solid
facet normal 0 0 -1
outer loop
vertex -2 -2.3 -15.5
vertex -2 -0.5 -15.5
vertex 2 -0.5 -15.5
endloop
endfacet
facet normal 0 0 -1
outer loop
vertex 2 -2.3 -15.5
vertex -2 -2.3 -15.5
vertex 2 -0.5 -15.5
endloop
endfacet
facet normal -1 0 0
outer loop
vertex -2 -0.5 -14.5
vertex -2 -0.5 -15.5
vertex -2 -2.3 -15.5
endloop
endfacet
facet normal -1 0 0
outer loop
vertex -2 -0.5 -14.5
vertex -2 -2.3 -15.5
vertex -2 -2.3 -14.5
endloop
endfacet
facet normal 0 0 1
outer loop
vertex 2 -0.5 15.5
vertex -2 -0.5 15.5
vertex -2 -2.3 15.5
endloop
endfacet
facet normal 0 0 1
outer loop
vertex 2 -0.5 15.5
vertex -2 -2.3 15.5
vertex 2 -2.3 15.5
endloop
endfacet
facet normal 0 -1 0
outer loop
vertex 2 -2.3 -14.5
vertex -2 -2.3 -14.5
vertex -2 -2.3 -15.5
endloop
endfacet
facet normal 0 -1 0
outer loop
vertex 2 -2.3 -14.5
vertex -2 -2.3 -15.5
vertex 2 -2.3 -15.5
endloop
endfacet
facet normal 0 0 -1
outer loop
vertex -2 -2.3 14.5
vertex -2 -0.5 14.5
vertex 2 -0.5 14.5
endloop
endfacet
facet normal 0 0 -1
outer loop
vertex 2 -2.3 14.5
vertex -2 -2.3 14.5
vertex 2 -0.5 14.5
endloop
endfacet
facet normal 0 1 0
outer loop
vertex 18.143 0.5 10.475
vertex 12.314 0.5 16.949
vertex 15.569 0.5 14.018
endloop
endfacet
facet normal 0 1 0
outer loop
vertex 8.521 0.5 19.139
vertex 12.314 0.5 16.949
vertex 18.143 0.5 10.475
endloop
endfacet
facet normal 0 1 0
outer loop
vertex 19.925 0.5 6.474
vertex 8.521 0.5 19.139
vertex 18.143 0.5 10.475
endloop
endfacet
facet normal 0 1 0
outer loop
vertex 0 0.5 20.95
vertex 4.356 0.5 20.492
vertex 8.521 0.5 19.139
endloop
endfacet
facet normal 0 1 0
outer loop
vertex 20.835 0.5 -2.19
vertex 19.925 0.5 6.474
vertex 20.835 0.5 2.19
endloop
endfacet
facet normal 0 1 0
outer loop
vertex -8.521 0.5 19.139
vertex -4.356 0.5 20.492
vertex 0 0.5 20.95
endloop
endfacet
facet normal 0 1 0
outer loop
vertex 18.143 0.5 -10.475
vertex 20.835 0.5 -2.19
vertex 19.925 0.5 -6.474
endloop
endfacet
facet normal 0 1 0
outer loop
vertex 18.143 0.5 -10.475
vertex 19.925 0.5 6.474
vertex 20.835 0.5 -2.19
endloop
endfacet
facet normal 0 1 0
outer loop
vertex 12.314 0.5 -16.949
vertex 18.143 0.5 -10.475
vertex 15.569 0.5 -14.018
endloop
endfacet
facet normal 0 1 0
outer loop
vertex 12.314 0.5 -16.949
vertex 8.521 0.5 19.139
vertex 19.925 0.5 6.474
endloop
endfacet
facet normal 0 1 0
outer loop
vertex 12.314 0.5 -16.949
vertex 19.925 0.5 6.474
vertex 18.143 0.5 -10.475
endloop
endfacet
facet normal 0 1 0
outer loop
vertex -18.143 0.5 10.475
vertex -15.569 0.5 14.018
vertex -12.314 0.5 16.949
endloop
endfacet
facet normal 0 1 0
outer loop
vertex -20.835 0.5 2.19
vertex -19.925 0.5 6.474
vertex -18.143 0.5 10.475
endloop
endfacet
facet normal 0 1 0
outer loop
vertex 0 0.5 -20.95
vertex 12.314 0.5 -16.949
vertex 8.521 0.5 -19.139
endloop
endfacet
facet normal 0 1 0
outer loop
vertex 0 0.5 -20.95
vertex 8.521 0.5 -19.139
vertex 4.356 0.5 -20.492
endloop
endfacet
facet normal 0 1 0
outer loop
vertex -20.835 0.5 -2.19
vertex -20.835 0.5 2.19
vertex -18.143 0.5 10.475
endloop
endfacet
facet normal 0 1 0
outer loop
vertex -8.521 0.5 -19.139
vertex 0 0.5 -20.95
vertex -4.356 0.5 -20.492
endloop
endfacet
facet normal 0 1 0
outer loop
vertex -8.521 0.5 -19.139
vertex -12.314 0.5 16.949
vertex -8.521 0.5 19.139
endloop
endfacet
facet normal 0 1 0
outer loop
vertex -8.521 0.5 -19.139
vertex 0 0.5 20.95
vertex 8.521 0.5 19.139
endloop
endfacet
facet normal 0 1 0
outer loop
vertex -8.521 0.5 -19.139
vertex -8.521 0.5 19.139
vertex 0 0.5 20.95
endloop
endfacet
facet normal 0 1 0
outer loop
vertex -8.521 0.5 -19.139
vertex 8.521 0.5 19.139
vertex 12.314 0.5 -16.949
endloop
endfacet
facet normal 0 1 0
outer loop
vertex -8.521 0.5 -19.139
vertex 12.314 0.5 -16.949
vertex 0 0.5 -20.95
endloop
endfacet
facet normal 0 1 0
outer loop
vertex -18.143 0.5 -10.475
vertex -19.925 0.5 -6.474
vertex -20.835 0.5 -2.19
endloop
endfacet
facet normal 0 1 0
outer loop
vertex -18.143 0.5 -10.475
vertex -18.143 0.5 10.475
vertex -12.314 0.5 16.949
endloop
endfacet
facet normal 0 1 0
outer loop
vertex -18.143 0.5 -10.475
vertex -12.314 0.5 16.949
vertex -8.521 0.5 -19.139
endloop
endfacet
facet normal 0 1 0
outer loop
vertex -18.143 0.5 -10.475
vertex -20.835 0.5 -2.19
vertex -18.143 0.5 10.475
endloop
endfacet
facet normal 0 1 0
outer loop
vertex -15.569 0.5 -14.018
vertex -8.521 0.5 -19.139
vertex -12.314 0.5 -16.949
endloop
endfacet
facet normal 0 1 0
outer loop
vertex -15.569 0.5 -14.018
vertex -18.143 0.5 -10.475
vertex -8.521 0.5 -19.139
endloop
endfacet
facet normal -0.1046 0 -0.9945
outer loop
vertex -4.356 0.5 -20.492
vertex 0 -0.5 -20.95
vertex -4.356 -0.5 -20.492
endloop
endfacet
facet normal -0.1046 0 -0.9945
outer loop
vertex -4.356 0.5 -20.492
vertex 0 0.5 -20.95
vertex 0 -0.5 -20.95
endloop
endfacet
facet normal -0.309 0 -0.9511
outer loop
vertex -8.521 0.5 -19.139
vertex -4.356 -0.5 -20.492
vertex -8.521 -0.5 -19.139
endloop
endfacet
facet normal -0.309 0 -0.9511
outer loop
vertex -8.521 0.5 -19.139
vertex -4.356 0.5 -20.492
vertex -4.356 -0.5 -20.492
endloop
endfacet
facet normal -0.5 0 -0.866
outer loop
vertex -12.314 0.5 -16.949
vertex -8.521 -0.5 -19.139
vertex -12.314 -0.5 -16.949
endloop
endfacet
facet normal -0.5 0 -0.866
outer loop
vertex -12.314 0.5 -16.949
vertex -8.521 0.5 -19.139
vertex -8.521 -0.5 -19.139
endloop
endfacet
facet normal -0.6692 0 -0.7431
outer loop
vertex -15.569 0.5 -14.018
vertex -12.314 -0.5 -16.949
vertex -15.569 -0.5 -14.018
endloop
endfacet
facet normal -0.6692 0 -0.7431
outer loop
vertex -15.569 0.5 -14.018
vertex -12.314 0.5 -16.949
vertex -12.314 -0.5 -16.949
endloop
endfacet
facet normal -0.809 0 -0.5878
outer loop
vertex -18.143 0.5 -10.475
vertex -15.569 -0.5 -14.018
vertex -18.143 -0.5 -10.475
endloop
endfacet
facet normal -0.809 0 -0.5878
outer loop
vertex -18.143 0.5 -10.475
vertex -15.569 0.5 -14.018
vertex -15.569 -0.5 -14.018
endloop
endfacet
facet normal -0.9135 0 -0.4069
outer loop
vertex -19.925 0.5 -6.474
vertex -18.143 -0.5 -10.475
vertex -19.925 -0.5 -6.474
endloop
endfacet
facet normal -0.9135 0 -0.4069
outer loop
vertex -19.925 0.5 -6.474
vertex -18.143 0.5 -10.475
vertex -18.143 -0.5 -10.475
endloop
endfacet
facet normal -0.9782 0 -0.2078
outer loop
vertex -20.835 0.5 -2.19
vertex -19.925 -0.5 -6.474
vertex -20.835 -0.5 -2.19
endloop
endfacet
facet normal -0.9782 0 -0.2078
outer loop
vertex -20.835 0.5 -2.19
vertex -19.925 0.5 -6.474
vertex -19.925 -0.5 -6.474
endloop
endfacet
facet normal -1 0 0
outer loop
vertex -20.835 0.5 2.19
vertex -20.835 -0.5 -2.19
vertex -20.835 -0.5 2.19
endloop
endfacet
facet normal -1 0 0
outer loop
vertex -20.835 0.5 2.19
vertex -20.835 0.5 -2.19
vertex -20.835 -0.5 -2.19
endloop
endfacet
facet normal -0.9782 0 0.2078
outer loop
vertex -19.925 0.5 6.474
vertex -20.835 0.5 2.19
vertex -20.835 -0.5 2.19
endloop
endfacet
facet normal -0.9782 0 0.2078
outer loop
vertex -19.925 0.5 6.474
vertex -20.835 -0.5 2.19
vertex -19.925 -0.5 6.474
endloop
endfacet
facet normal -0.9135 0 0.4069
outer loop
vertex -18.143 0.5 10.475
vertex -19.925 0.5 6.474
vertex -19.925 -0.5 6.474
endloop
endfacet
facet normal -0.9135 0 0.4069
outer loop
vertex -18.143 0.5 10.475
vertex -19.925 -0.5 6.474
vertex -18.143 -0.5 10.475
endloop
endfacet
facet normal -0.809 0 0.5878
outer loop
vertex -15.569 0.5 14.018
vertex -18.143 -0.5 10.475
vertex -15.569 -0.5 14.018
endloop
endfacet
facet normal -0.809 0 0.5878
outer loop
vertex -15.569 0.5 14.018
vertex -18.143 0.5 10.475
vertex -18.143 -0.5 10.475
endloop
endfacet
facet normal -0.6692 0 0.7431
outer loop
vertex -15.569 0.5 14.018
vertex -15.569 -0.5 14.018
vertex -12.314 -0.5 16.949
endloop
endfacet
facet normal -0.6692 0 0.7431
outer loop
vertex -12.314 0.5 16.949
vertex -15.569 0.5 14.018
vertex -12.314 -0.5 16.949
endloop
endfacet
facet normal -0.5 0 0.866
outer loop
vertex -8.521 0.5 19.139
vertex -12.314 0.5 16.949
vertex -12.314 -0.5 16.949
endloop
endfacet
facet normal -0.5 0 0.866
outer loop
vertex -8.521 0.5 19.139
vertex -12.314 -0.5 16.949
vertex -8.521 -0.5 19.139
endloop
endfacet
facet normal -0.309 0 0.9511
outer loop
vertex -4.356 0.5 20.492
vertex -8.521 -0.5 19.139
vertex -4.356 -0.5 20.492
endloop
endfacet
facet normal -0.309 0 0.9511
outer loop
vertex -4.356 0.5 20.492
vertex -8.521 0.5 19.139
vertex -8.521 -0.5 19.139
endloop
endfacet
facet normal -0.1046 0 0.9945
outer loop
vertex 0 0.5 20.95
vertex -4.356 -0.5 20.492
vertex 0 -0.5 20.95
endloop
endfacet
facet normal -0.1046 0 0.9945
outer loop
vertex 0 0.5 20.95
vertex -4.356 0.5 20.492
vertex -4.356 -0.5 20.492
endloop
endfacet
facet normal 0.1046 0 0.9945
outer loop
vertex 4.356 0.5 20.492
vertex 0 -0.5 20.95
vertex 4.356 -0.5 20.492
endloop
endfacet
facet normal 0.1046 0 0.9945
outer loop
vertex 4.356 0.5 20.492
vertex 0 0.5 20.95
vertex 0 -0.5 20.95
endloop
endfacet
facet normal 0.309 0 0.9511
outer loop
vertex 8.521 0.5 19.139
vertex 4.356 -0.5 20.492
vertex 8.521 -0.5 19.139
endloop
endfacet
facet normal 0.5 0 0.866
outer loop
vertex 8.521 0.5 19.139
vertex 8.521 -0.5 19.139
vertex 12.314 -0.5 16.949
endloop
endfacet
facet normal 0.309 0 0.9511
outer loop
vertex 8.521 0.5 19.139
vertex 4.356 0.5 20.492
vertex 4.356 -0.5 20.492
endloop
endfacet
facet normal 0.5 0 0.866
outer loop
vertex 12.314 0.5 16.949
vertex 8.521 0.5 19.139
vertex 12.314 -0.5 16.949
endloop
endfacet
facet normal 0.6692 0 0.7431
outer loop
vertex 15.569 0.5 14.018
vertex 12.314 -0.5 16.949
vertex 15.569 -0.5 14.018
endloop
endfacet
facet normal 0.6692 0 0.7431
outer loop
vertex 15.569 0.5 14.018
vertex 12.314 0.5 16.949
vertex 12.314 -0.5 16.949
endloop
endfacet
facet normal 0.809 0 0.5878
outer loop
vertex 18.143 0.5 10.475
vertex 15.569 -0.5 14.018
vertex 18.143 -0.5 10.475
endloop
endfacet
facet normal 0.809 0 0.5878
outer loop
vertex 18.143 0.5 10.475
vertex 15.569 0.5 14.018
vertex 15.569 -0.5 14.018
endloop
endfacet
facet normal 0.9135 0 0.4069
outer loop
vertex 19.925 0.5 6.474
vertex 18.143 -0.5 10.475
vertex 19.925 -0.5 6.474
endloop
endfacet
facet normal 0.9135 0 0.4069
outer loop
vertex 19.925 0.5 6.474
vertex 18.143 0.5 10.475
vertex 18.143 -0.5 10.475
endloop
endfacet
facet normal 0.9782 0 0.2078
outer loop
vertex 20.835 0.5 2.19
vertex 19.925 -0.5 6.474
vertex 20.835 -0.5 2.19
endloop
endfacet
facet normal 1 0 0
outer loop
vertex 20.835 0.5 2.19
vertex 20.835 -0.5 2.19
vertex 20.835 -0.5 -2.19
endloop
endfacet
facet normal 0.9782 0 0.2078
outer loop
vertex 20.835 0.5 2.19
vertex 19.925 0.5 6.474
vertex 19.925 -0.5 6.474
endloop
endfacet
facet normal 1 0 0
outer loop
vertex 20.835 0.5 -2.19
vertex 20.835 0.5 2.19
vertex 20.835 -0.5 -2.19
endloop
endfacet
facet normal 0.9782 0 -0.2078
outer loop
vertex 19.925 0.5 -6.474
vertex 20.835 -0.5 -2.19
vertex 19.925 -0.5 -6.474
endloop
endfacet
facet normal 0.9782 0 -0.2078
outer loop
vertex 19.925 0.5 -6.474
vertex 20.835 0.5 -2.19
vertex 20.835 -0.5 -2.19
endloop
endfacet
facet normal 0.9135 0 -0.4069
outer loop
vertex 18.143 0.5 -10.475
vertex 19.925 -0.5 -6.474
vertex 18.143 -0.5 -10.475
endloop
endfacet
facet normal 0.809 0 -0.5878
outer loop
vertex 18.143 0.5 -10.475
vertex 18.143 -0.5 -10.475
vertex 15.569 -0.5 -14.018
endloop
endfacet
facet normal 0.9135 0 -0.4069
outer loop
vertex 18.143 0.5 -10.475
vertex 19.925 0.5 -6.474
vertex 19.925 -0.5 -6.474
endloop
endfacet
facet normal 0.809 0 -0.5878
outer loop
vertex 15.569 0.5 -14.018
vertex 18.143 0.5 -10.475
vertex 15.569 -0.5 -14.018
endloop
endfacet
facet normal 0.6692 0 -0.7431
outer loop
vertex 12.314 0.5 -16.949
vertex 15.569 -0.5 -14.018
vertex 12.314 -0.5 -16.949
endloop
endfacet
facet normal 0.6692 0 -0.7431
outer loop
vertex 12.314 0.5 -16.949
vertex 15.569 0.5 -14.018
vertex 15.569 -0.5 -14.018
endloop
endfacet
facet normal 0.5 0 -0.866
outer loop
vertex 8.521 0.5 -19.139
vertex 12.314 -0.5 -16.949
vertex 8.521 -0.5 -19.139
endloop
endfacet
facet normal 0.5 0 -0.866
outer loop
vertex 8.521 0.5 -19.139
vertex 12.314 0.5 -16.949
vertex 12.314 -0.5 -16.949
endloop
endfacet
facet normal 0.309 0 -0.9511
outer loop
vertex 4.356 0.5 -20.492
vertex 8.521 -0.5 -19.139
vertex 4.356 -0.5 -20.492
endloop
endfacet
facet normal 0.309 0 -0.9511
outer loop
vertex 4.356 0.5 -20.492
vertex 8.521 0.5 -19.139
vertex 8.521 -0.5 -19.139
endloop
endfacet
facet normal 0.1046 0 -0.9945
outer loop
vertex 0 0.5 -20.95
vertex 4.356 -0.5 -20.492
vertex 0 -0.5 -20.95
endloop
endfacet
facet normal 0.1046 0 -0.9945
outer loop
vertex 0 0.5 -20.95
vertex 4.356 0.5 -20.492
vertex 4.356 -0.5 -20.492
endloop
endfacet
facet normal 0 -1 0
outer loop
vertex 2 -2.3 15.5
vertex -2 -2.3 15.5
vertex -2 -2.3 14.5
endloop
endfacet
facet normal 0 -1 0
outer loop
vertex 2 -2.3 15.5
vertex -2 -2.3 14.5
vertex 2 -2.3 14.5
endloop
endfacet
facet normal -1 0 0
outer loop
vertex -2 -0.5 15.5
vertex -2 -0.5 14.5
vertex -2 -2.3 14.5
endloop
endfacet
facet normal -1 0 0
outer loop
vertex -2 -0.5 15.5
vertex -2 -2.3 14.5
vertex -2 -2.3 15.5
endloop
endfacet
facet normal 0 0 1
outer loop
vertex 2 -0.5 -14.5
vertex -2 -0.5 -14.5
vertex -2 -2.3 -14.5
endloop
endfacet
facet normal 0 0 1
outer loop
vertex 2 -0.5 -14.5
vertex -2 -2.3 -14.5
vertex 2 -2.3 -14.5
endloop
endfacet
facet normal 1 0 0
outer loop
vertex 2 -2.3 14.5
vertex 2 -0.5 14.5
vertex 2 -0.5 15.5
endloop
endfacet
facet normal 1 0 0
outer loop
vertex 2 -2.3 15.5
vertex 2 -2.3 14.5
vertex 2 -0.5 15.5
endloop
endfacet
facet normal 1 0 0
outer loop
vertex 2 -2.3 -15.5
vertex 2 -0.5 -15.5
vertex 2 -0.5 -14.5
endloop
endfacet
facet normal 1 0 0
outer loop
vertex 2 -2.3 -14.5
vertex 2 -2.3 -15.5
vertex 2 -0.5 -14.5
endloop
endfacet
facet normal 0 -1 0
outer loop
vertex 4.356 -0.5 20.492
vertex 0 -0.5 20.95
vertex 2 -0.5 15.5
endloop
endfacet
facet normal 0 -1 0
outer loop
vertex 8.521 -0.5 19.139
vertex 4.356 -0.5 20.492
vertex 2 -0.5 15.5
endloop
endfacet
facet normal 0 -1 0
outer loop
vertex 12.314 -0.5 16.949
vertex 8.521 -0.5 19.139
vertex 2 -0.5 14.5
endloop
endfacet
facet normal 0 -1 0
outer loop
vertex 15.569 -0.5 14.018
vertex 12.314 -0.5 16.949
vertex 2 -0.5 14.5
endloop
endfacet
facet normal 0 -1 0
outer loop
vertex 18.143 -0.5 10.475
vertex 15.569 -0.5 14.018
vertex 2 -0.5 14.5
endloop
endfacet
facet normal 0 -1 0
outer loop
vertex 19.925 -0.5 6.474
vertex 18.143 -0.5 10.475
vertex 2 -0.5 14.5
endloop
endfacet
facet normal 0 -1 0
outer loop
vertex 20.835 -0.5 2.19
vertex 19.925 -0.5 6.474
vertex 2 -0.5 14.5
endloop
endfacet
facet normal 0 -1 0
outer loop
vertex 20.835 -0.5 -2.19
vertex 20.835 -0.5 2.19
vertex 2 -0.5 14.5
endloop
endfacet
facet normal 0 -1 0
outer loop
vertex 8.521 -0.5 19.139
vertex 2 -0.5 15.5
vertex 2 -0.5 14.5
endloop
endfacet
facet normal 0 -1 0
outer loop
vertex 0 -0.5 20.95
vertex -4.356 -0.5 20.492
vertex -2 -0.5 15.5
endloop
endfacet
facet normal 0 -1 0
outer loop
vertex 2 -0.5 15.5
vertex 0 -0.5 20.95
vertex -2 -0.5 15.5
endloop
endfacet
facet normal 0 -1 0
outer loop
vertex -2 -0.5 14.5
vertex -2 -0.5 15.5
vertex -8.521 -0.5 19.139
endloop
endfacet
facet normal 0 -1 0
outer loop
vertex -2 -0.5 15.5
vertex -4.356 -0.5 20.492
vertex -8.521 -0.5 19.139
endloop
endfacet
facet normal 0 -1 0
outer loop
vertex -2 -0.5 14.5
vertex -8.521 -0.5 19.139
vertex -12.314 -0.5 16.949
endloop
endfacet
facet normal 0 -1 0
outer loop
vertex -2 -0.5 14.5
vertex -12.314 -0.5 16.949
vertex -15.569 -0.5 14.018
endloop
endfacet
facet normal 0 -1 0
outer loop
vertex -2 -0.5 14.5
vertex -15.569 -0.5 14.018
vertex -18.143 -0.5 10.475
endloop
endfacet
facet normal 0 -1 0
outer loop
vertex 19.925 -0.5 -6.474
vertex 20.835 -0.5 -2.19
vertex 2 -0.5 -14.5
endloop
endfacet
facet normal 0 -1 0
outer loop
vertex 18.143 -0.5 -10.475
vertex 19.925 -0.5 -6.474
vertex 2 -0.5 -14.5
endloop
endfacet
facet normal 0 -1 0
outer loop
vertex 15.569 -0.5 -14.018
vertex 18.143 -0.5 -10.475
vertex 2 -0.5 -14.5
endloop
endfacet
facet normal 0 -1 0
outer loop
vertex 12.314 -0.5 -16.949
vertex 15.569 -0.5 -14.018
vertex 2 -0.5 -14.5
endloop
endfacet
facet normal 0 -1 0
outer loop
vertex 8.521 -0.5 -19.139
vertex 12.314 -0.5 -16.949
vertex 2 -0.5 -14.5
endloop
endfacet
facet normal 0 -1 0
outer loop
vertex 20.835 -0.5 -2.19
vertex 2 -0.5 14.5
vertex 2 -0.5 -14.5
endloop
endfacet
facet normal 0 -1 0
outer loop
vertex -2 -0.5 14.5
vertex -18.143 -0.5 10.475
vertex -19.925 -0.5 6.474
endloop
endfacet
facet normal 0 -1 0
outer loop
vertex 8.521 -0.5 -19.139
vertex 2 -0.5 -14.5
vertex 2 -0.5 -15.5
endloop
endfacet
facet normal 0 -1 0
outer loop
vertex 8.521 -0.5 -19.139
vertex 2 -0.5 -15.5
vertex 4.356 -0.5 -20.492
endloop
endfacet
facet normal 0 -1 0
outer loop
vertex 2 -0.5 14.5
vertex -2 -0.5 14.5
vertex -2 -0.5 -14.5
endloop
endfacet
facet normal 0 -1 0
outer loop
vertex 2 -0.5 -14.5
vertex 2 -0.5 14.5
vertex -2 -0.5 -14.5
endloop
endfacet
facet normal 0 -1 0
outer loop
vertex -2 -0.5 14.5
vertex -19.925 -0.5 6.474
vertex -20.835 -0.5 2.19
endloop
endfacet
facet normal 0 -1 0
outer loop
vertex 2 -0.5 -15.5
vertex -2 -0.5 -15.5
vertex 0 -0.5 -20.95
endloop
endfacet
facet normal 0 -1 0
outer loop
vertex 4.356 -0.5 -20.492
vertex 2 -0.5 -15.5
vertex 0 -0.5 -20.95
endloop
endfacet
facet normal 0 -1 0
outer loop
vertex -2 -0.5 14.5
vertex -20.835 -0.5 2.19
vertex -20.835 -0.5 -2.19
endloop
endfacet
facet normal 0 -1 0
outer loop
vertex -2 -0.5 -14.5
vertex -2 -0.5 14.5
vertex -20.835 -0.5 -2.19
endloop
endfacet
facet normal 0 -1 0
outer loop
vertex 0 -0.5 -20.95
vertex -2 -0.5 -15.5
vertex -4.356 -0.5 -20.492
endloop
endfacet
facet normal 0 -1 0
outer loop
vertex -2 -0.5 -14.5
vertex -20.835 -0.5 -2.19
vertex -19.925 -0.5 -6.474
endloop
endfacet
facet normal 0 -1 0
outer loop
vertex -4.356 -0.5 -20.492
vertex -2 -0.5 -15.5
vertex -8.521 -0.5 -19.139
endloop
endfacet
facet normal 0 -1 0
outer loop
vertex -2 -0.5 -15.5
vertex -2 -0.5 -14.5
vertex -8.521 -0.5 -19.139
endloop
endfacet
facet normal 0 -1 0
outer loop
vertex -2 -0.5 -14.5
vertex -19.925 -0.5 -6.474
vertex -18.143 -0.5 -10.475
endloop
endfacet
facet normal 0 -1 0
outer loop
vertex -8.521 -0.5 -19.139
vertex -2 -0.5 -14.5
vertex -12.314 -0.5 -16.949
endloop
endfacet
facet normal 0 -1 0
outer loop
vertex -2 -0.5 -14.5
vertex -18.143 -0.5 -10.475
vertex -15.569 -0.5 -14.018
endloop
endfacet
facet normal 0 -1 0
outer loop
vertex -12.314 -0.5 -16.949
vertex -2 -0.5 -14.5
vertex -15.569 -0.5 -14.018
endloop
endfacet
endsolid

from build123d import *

# Parameters (mm, degrees)
FRONT_W       = 20.95
FRONT_H       = 1
SKETCH1_W     = 4
SKETCH1_H     = 1
HOLDERS_DEPTH = 1.8


with BuildPart() as part:
    # Front → Base (revolve)
    with BuildSketch(Plane.XY, mode=Mode.PRIVATE) as base_sk:
        with Locations((-10.475, 0)):
            Rectangle(FRONT_W, FRONT_H)
    revolve(base_sk.sketch.rotate(Axis((0, 0, 0), (0, 1, 0)), 270), axis=Axis((0, 0, 0), (0, 1, 0)))

    # Sketch1 → Holders (add)
    with BuildSketch(Plane.XZ.offset(0.5)):
        with Locations((0, 15)):
            Rectangle(SKETCH1_W, SKETCH1_H)
        with Locations((0, -15)):
            Rectangle(SKETCH1_W, SKETCH1_H)
    extrude(amount=HOLDERS_DEPTH)


solid = part.part
